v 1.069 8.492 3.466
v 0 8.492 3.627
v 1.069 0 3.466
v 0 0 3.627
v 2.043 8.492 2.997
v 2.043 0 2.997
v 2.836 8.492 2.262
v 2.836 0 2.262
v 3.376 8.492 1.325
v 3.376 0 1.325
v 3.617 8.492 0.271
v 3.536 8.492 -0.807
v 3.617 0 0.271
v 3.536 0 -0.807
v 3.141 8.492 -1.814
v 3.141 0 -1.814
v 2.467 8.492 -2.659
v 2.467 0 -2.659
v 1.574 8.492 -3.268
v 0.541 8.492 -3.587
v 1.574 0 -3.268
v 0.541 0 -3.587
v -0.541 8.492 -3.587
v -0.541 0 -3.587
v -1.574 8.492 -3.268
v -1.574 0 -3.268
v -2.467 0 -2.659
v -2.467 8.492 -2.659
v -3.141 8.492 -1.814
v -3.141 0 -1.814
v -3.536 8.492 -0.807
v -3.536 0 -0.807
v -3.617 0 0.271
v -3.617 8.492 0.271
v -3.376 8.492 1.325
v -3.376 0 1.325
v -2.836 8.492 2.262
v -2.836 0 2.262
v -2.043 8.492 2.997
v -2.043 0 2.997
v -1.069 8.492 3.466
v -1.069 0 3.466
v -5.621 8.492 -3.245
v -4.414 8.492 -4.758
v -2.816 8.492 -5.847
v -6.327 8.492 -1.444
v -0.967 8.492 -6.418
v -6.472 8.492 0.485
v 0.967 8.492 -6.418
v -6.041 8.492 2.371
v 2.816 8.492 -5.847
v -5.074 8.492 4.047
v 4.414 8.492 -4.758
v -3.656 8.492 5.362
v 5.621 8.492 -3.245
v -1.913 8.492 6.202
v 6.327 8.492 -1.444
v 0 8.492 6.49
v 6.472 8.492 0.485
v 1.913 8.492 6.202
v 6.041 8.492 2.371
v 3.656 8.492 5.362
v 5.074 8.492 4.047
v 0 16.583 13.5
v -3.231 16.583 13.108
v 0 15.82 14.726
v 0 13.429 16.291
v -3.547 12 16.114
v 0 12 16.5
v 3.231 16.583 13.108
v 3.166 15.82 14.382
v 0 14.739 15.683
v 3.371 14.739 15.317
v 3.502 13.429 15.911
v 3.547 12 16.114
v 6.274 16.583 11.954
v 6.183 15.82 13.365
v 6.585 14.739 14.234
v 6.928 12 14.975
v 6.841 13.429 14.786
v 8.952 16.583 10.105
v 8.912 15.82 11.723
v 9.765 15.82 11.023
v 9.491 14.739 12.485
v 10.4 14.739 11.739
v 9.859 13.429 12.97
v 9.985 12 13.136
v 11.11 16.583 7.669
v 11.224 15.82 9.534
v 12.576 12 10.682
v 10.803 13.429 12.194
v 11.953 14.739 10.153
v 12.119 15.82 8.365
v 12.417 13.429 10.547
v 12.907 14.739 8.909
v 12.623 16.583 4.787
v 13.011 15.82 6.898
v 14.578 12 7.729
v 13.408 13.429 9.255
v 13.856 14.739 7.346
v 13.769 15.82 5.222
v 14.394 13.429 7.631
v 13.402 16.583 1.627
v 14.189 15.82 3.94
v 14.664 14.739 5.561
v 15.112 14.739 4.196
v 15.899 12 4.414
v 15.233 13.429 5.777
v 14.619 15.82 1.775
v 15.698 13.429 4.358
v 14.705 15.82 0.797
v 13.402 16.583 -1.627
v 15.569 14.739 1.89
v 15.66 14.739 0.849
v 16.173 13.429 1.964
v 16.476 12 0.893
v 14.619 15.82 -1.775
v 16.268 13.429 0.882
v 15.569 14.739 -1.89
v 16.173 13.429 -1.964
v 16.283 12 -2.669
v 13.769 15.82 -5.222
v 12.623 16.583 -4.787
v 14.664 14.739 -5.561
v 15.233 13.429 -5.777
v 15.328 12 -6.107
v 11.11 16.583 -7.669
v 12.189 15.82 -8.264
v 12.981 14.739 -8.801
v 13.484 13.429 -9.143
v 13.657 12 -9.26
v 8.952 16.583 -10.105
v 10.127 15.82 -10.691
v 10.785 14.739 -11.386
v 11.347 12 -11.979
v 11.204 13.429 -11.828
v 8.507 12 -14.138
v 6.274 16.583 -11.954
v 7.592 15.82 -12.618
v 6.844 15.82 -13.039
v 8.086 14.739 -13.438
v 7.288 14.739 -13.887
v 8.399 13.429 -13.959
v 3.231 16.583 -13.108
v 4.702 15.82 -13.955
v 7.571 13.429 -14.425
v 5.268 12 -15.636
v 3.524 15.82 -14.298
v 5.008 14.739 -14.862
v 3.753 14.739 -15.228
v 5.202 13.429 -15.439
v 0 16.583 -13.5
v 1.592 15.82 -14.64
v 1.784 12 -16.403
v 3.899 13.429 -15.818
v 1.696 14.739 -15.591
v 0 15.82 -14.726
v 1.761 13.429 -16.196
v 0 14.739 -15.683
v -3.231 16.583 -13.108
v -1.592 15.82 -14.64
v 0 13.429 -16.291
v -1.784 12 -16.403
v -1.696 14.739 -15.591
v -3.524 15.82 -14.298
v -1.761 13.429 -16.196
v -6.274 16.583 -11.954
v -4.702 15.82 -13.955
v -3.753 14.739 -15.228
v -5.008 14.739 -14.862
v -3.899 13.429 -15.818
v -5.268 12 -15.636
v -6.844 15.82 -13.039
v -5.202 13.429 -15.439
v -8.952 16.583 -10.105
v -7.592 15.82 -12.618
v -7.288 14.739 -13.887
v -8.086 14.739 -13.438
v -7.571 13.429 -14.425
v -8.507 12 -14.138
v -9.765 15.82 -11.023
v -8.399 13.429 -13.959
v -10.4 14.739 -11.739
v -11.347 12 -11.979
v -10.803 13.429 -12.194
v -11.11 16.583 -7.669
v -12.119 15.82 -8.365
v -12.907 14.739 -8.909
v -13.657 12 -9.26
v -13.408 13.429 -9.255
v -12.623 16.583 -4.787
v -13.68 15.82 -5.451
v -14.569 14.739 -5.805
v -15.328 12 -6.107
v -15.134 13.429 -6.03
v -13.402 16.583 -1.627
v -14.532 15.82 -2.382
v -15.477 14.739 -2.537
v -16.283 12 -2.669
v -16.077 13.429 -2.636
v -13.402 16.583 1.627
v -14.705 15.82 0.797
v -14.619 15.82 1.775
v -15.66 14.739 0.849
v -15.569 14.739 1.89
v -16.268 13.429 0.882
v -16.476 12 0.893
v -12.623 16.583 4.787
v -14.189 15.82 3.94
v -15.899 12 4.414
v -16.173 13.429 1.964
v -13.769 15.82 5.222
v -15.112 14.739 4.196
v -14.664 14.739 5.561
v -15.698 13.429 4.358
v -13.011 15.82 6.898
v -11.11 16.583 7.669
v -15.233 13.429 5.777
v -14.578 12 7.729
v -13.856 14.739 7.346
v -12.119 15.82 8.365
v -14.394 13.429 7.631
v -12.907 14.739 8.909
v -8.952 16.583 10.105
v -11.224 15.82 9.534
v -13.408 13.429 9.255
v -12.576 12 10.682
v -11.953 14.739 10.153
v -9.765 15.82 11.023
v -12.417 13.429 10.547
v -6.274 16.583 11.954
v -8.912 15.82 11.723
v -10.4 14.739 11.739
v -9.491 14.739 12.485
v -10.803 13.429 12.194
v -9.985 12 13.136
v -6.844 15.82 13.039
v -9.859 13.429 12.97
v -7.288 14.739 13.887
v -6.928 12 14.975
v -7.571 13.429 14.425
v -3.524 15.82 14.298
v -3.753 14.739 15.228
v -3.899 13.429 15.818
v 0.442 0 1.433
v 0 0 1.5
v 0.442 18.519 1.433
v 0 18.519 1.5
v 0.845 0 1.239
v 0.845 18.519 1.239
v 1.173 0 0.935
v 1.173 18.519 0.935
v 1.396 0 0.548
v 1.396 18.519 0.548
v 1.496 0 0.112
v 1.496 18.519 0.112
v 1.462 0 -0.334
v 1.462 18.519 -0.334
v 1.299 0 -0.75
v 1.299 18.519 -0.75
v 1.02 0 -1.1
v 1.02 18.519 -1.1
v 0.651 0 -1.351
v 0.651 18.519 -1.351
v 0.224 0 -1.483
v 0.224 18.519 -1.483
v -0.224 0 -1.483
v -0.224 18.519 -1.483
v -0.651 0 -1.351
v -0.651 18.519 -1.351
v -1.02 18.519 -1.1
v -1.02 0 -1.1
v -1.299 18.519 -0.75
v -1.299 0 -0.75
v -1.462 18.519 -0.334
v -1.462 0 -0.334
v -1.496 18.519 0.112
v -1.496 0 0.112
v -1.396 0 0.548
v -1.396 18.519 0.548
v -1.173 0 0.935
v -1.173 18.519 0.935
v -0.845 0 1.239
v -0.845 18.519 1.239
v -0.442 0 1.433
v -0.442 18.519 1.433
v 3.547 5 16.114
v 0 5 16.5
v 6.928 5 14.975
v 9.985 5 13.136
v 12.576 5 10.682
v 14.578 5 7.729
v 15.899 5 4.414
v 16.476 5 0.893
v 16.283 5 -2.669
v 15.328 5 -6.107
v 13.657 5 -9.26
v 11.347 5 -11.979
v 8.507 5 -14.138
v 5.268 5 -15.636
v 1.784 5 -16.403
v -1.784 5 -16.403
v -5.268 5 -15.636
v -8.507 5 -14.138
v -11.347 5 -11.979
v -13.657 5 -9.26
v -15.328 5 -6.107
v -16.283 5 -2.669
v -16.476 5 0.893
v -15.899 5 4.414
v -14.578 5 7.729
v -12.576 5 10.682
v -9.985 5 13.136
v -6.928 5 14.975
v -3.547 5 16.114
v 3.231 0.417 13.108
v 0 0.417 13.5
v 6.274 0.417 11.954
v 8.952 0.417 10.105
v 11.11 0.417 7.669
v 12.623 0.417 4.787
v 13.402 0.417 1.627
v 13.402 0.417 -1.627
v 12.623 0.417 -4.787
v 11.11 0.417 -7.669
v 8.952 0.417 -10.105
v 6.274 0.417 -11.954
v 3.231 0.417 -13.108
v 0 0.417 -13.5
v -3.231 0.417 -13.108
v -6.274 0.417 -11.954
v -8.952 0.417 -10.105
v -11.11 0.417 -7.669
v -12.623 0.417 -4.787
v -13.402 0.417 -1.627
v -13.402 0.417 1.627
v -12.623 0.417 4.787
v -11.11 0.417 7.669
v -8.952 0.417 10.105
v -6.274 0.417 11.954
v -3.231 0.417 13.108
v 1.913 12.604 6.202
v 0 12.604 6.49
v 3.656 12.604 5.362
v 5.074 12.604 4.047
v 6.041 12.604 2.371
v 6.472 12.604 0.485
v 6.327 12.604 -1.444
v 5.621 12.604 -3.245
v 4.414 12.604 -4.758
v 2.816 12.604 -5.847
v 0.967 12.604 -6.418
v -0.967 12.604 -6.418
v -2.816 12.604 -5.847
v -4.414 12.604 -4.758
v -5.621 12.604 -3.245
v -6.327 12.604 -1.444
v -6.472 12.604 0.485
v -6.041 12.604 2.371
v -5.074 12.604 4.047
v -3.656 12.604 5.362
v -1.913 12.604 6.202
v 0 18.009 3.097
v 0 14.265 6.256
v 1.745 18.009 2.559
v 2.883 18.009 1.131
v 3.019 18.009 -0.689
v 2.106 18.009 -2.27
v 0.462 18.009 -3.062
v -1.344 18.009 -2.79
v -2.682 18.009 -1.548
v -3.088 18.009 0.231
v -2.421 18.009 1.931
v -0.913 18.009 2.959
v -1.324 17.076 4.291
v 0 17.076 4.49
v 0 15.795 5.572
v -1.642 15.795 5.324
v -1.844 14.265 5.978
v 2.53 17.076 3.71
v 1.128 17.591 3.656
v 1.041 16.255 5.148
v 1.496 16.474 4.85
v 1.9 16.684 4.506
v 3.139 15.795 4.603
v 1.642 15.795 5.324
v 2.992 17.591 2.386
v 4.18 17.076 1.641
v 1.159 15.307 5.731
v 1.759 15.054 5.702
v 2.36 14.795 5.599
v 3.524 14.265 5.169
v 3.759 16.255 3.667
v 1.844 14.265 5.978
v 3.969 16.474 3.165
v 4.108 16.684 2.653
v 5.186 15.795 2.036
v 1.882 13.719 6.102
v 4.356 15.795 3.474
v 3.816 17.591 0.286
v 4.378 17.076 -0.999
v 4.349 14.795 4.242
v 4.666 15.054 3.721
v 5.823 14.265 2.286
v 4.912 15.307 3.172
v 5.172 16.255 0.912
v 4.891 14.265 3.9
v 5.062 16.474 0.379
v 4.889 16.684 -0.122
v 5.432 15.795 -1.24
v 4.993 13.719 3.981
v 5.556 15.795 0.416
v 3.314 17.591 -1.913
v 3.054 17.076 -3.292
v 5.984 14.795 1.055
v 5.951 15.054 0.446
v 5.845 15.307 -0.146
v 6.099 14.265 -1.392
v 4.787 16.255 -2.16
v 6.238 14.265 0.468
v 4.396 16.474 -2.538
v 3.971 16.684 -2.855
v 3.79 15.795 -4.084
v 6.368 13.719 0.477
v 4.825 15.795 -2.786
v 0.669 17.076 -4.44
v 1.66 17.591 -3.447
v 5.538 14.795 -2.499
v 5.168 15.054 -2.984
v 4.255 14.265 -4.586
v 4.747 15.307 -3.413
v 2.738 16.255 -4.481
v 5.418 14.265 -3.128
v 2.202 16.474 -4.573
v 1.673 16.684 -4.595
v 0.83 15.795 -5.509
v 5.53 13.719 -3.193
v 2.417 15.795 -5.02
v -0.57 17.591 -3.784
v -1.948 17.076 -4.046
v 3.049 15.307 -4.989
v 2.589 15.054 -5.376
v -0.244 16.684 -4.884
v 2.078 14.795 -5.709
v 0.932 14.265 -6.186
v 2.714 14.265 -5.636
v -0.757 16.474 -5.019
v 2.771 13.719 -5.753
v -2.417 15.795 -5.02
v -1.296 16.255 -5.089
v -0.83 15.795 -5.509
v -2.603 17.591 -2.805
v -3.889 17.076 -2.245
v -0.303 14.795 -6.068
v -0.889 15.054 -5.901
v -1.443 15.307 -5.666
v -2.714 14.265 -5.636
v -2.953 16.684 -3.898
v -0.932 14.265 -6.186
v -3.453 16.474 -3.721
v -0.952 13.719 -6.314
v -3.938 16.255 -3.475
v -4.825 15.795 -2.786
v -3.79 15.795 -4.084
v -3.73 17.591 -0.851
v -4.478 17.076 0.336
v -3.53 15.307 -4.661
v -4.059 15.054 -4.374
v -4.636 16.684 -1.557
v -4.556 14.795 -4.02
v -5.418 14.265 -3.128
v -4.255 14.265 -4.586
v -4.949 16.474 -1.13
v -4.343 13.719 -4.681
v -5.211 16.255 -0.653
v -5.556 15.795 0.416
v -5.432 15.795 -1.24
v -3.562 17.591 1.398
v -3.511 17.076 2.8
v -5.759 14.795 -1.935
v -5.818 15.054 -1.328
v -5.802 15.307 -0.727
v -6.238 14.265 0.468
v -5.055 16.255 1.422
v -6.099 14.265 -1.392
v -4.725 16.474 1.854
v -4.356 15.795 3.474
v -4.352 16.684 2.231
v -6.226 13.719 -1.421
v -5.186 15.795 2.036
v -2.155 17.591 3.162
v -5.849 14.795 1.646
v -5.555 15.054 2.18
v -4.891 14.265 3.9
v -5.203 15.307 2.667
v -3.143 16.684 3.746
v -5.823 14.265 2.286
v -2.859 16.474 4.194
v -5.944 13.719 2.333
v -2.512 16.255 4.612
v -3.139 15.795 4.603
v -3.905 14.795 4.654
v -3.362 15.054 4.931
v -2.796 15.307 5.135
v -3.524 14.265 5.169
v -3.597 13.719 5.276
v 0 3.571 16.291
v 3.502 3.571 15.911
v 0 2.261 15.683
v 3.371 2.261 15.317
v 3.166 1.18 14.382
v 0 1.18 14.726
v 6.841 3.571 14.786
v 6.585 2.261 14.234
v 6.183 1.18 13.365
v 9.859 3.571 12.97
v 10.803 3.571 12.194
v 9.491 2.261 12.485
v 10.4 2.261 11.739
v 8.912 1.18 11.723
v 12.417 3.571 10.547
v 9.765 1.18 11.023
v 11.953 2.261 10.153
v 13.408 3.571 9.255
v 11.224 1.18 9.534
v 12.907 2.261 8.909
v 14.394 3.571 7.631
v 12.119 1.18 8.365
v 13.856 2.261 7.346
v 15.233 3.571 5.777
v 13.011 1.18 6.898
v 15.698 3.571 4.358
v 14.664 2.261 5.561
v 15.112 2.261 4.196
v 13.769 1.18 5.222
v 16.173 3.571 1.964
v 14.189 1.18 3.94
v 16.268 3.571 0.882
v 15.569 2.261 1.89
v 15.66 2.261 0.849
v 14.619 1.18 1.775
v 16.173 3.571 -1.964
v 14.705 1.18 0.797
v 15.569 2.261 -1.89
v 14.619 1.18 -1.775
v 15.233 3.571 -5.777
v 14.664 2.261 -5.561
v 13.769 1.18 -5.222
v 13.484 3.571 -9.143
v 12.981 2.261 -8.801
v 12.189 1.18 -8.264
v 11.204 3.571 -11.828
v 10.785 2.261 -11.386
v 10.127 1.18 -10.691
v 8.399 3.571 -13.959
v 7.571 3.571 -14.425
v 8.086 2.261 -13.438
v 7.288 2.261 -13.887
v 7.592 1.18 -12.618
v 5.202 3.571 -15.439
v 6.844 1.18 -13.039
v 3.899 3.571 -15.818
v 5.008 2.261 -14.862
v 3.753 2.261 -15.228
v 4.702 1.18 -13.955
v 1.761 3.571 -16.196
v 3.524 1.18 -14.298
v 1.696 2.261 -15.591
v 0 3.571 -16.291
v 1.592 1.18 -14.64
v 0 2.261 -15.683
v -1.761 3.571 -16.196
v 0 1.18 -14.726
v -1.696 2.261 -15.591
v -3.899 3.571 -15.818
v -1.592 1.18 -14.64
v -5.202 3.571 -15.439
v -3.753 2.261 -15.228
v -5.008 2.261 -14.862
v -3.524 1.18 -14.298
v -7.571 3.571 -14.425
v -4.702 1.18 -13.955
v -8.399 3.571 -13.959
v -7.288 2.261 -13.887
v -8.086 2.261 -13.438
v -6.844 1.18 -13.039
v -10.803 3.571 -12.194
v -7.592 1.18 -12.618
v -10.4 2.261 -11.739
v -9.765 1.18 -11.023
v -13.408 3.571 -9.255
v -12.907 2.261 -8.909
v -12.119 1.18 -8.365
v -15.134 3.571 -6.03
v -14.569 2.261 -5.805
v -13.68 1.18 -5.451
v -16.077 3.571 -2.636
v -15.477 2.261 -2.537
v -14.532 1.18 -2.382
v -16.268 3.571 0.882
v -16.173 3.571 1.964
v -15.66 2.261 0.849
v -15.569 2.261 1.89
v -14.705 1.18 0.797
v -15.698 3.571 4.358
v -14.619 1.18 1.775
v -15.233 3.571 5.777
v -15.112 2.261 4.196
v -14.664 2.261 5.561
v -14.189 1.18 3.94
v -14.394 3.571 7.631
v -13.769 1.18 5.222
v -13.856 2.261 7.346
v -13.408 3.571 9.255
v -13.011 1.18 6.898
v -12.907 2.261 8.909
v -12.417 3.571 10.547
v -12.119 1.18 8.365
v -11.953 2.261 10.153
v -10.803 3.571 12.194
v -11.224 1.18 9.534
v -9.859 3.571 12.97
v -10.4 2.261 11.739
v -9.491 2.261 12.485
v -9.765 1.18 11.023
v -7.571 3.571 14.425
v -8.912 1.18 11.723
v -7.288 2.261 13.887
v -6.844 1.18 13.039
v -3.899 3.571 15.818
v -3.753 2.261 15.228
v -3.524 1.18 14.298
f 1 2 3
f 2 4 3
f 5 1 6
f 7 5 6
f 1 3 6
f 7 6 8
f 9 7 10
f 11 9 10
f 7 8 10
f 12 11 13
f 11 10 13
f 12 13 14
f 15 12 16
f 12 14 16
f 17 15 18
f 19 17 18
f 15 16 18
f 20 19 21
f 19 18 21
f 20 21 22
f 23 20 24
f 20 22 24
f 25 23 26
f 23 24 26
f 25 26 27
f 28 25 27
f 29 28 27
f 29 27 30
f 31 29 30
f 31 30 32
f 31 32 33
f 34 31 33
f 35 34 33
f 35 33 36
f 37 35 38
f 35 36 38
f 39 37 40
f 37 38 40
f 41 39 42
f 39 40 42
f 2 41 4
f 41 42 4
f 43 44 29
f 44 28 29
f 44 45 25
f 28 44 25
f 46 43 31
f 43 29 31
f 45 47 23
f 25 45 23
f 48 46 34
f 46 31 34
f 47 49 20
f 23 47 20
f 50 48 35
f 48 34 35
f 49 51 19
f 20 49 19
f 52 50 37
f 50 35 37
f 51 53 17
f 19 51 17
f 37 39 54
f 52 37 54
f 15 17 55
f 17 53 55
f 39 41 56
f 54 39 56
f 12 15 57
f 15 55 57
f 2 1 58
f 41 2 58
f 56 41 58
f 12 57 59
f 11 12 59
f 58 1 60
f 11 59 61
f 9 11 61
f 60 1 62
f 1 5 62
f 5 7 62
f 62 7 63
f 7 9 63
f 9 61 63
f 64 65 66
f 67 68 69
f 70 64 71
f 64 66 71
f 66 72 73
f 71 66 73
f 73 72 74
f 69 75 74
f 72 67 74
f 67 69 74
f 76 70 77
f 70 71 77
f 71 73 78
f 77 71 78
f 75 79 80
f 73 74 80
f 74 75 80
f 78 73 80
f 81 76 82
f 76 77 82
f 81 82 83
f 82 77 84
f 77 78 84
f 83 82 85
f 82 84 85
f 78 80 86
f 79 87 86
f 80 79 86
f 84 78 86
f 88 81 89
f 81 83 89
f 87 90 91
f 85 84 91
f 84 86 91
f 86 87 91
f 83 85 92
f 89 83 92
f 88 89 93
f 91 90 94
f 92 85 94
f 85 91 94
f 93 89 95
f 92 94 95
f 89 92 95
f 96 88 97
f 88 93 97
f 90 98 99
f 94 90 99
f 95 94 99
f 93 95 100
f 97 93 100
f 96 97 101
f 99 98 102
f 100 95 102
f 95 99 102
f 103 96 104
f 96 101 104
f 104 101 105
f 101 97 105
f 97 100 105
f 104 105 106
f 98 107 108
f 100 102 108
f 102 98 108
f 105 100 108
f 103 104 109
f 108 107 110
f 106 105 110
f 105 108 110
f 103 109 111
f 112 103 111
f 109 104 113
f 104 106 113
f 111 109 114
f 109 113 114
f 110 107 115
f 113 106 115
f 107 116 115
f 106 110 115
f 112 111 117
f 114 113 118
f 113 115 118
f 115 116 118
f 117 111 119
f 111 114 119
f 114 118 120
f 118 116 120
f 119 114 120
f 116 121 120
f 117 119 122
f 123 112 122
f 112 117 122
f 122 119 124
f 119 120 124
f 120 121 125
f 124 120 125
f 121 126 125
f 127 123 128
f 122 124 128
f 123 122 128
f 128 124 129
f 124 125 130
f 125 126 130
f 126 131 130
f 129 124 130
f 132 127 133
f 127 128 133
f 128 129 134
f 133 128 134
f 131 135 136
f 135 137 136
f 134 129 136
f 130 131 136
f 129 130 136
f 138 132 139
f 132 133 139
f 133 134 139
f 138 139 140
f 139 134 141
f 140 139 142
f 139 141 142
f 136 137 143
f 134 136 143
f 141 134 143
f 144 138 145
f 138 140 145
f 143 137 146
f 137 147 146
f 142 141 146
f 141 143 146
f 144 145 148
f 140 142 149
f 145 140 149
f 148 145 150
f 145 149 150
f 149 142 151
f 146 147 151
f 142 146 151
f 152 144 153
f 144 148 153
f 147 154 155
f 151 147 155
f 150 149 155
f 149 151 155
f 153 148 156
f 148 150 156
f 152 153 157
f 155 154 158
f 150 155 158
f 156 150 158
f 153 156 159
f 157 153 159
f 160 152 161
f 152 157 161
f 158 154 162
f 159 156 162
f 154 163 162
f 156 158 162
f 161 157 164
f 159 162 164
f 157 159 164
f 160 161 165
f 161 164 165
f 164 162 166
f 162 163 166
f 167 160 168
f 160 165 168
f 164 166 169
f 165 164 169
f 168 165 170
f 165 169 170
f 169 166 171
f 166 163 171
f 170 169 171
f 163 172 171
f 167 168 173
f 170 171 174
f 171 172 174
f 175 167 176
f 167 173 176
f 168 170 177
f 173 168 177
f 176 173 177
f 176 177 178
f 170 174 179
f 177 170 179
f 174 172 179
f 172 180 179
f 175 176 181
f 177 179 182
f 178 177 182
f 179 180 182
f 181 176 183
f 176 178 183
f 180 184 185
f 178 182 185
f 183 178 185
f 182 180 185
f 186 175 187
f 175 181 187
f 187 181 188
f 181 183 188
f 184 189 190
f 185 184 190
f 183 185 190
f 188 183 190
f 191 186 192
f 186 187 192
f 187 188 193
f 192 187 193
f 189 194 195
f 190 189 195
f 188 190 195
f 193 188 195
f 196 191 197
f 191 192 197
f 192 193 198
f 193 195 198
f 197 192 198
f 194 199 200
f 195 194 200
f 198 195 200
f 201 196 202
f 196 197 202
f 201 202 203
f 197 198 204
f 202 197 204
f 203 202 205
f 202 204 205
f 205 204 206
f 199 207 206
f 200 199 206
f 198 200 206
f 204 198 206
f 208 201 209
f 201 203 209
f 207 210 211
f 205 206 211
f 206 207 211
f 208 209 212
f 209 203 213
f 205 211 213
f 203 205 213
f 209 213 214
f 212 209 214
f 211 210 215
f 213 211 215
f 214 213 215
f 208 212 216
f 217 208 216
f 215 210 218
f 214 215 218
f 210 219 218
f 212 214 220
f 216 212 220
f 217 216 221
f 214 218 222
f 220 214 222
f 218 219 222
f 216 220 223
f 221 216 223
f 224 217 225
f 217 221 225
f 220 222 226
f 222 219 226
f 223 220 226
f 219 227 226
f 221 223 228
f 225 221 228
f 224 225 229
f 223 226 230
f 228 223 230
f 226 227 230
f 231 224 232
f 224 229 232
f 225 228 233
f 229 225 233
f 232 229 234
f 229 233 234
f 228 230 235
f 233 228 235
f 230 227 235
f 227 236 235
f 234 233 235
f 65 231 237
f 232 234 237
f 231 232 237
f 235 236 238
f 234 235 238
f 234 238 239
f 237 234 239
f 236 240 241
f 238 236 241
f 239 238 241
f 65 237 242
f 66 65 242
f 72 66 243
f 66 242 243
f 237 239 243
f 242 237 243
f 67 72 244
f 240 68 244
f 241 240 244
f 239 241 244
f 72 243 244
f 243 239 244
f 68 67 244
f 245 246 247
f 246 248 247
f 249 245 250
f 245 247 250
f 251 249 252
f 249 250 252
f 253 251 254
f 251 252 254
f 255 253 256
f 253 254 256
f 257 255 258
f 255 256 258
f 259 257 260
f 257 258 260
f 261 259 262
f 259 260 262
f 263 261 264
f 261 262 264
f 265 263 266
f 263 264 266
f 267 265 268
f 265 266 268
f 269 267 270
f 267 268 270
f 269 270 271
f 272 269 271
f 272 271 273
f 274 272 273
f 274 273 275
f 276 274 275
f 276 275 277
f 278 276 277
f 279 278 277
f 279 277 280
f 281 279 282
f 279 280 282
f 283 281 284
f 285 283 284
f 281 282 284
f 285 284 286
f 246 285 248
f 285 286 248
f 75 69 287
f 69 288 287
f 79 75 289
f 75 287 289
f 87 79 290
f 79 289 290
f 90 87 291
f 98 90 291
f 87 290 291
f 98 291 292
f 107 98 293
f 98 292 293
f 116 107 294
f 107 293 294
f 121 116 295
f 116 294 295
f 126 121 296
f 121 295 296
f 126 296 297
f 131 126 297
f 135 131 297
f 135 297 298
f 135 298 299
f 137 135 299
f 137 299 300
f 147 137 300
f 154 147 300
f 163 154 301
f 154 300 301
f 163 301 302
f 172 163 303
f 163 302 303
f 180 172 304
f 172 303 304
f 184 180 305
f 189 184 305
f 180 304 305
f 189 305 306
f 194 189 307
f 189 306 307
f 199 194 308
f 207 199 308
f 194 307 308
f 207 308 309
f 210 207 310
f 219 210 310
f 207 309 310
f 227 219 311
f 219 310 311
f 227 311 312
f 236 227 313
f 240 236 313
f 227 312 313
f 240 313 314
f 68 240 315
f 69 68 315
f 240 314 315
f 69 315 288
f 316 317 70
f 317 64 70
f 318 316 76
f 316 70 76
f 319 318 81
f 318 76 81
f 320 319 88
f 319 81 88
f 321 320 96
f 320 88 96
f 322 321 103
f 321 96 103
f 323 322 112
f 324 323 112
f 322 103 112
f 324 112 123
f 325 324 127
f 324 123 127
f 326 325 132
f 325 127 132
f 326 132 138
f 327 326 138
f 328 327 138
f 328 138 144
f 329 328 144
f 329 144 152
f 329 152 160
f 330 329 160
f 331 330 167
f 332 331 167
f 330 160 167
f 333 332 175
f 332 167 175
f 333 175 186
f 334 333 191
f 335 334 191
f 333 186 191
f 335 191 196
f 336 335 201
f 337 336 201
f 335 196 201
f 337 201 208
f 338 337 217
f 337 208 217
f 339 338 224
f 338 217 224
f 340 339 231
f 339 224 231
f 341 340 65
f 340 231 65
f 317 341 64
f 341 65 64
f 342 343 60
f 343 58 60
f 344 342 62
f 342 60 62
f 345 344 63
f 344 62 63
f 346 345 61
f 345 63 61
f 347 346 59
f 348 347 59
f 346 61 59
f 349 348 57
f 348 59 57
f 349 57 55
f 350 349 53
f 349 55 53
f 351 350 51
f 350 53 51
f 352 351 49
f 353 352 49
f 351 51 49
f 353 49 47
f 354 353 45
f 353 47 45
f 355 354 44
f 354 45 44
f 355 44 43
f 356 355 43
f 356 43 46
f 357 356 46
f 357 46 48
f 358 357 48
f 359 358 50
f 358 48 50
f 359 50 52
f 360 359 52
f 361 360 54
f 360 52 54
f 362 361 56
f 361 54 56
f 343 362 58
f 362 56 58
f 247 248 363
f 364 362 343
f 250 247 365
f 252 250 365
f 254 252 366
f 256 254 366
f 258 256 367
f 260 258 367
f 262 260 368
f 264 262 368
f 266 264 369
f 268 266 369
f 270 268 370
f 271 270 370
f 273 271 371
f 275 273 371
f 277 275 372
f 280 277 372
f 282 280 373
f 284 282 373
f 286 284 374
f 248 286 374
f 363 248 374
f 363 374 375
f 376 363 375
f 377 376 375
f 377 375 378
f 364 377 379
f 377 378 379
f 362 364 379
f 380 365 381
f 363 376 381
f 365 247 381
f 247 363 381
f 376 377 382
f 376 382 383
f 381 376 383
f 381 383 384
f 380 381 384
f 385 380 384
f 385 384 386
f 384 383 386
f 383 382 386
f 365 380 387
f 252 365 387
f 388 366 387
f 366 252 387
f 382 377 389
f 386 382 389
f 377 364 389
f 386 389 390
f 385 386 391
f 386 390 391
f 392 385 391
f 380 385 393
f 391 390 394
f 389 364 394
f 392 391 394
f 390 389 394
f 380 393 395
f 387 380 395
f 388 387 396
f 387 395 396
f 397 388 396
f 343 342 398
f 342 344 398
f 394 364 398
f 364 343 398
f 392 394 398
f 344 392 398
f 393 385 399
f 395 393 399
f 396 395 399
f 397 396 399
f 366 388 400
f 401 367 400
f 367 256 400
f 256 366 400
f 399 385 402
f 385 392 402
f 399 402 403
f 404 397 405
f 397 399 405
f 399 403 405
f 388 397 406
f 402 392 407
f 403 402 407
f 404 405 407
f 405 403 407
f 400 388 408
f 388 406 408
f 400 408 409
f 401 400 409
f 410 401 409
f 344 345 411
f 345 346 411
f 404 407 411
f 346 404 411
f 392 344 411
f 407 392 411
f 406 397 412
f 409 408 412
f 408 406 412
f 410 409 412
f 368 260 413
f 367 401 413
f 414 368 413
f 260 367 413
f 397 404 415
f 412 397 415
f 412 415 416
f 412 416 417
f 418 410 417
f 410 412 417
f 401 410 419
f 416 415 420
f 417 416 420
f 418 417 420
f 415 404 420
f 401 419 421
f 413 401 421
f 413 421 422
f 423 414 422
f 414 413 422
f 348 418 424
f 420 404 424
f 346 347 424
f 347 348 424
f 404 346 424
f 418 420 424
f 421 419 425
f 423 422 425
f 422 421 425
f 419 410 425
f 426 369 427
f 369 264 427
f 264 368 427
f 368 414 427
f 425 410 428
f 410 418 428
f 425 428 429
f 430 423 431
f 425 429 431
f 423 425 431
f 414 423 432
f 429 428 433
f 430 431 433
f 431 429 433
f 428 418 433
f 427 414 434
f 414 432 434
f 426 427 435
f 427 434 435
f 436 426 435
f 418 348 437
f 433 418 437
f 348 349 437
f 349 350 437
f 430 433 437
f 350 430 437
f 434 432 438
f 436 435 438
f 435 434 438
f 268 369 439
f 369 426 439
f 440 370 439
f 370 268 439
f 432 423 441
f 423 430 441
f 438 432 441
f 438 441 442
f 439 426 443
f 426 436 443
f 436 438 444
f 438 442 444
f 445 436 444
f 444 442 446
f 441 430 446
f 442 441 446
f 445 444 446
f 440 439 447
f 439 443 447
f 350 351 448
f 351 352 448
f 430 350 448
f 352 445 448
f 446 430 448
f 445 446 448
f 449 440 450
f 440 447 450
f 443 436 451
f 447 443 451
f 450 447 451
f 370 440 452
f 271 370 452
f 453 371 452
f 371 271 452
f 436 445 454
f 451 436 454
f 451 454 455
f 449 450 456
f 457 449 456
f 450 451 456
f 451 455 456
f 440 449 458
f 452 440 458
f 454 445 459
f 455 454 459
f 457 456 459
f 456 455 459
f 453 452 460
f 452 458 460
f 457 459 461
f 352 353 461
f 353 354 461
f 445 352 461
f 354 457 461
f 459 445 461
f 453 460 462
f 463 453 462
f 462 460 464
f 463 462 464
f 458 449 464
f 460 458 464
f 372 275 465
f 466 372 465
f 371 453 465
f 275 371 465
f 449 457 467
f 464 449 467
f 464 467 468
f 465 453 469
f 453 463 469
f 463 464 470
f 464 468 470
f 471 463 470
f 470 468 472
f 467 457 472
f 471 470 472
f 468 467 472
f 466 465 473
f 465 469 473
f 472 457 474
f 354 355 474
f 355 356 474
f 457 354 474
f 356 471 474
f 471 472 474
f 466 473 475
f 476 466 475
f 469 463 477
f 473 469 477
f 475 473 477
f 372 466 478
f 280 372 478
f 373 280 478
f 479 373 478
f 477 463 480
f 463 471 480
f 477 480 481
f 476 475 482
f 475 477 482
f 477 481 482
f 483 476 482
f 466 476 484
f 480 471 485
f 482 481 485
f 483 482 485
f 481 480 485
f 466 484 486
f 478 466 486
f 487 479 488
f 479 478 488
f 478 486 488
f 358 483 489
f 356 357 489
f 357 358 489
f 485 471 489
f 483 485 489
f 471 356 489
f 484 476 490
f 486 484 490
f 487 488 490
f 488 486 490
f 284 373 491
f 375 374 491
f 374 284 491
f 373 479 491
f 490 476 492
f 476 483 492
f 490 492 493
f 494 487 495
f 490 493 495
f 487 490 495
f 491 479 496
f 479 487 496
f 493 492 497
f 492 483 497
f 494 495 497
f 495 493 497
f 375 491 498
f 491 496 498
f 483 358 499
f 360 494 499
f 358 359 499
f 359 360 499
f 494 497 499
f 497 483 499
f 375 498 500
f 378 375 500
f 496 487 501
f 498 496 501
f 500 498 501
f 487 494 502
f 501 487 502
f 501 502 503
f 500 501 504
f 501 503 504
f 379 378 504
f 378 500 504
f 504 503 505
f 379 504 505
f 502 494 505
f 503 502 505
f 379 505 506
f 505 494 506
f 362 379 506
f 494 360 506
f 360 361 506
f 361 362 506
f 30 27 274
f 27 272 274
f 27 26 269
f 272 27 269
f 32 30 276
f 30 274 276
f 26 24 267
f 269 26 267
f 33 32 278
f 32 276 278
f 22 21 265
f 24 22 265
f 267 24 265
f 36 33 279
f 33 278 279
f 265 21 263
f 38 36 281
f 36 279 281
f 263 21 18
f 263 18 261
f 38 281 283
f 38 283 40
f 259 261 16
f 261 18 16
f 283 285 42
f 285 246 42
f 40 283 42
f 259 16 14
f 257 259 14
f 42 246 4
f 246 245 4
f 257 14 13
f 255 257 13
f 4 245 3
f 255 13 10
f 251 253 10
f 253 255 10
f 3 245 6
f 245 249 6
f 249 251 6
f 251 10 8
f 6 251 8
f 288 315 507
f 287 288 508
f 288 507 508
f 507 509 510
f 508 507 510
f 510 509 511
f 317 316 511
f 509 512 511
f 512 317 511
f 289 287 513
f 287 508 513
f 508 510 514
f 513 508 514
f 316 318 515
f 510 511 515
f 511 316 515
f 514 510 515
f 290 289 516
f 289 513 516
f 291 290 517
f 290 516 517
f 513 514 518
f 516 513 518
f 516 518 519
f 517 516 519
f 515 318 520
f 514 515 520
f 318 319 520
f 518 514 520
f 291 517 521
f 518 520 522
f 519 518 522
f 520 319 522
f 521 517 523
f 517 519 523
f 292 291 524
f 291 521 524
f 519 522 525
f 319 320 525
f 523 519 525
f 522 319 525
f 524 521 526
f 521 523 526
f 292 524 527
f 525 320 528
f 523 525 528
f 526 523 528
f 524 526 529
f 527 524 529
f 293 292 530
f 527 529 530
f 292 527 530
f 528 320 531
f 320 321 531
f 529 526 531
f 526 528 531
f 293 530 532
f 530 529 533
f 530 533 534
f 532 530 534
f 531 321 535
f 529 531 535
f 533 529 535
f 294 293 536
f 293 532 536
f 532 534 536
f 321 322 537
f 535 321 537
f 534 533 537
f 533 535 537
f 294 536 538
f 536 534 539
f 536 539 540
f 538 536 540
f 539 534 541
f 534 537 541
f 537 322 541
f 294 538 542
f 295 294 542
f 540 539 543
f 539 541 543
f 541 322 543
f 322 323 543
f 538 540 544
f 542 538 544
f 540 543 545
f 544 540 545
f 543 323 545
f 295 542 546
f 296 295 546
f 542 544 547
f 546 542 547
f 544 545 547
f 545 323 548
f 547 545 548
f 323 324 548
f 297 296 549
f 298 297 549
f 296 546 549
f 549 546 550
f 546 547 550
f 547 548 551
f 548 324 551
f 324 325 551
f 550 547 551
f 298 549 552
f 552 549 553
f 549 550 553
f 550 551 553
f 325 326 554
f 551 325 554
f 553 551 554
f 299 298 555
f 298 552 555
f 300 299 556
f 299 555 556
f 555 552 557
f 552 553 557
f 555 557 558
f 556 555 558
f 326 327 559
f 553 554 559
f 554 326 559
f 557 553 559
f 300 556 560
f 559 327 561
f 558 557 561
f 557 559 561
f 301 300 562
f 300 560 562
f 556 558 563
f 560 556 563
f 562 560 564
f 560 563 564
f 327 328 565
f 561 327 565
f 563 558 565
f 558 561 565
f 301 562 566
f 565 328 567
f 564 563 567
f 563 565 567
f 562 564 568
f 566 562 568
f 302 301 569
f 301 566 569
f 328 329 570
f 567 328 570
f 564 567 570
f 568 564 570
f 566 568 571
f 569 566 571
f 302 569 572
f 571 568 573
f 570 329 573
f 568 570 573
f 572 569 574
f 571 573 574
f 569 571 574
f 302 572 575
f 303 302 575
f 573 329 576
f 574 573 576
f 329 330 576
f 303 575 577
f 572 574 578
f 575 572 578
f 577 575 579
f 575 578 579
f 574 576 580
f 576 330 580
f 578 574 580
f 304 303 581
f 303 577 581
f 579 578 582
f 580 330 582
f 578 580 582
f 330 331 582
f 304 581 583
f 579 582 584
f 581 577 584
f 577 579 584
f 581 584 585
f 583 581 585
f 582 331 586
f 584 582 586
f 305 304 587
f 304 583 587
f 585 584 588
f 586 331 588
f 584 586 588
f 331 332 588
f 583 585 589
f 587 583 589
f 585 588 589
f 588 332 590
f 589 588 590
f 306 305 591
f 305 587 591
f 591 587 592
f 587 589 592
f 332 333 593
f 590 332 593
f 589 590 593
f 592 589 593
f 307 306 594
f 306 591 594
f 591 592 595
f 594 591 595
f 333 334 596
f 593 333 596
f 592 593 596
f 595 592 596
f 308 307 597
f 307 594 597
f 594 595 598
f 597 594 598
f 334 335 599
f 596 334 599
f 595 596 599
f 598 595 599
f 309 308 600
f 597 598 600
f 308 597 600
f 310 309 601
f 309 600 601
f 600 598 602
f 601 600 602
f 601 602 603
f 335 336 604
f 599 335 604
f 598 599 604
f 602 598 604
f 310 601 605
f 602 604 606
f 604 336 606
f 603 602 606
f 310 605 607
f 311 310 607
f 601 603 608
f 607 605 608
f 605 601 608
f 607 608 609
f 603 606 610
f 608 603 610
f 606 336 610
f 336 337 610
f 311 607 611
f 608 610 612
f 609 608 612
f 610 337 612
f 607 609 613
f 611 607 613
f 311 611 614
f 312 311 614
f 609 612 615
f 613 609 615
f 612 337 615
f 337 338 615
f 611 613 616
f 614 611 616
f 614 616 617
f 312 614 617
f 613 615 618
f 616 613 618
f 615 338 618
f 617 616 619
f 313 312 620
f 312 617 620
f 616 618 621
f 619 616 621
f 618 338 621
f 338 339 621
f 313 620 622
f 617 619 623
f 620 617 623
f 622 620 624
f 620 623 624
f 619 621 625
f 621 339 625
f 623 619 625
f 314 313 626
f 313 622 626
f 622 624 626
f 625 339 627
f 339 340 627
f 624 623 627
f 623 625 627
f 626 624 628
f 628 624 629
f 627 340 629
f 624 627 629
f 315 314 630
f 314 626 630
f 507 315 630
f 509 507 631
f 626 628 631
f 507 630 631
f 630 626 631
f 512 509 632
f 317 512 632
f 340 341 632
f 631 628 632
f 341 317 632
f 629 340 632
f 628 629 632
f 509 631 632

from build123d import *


with BuildPart() as f1:
    # F0 (on Right) → F1 (revolve)
    with BuildSketch(Plane.YZ):
        with BuildLine():
            Line((12, 16.5), (5, 16.5))
            ThreePointArc((5, 16.5), (2.261387, 15.6833), (0.417424, 13.5))
            Line((0.417424, 13.5), (16.582576, 13.5))
            ThreePointArc((16.582576, 13.5), (14.738613, 15.6833), (12, 16.5))
        make_face()
        with BuildLine():
            Line((8.492263, 3.627209), (0, 3.627209))
            Line((0, 3.627209), (0, 1.5))
            Line((0, 1.5), (18.5189, 1.5))
            ThreePointArc((18.5189, 1.5), (16.473655, 5.075935), (12.604497, 6.49013))
            Line((12.604497, 6.49013), (8.492263, 6.49013))
            Line((8.492263, 6.49013), (8.492263, 3.627209))
        make_face()
    revolve(axis=Axis((0, 2.603494, 0), (0, 1, 0)))


solid = f1.part
